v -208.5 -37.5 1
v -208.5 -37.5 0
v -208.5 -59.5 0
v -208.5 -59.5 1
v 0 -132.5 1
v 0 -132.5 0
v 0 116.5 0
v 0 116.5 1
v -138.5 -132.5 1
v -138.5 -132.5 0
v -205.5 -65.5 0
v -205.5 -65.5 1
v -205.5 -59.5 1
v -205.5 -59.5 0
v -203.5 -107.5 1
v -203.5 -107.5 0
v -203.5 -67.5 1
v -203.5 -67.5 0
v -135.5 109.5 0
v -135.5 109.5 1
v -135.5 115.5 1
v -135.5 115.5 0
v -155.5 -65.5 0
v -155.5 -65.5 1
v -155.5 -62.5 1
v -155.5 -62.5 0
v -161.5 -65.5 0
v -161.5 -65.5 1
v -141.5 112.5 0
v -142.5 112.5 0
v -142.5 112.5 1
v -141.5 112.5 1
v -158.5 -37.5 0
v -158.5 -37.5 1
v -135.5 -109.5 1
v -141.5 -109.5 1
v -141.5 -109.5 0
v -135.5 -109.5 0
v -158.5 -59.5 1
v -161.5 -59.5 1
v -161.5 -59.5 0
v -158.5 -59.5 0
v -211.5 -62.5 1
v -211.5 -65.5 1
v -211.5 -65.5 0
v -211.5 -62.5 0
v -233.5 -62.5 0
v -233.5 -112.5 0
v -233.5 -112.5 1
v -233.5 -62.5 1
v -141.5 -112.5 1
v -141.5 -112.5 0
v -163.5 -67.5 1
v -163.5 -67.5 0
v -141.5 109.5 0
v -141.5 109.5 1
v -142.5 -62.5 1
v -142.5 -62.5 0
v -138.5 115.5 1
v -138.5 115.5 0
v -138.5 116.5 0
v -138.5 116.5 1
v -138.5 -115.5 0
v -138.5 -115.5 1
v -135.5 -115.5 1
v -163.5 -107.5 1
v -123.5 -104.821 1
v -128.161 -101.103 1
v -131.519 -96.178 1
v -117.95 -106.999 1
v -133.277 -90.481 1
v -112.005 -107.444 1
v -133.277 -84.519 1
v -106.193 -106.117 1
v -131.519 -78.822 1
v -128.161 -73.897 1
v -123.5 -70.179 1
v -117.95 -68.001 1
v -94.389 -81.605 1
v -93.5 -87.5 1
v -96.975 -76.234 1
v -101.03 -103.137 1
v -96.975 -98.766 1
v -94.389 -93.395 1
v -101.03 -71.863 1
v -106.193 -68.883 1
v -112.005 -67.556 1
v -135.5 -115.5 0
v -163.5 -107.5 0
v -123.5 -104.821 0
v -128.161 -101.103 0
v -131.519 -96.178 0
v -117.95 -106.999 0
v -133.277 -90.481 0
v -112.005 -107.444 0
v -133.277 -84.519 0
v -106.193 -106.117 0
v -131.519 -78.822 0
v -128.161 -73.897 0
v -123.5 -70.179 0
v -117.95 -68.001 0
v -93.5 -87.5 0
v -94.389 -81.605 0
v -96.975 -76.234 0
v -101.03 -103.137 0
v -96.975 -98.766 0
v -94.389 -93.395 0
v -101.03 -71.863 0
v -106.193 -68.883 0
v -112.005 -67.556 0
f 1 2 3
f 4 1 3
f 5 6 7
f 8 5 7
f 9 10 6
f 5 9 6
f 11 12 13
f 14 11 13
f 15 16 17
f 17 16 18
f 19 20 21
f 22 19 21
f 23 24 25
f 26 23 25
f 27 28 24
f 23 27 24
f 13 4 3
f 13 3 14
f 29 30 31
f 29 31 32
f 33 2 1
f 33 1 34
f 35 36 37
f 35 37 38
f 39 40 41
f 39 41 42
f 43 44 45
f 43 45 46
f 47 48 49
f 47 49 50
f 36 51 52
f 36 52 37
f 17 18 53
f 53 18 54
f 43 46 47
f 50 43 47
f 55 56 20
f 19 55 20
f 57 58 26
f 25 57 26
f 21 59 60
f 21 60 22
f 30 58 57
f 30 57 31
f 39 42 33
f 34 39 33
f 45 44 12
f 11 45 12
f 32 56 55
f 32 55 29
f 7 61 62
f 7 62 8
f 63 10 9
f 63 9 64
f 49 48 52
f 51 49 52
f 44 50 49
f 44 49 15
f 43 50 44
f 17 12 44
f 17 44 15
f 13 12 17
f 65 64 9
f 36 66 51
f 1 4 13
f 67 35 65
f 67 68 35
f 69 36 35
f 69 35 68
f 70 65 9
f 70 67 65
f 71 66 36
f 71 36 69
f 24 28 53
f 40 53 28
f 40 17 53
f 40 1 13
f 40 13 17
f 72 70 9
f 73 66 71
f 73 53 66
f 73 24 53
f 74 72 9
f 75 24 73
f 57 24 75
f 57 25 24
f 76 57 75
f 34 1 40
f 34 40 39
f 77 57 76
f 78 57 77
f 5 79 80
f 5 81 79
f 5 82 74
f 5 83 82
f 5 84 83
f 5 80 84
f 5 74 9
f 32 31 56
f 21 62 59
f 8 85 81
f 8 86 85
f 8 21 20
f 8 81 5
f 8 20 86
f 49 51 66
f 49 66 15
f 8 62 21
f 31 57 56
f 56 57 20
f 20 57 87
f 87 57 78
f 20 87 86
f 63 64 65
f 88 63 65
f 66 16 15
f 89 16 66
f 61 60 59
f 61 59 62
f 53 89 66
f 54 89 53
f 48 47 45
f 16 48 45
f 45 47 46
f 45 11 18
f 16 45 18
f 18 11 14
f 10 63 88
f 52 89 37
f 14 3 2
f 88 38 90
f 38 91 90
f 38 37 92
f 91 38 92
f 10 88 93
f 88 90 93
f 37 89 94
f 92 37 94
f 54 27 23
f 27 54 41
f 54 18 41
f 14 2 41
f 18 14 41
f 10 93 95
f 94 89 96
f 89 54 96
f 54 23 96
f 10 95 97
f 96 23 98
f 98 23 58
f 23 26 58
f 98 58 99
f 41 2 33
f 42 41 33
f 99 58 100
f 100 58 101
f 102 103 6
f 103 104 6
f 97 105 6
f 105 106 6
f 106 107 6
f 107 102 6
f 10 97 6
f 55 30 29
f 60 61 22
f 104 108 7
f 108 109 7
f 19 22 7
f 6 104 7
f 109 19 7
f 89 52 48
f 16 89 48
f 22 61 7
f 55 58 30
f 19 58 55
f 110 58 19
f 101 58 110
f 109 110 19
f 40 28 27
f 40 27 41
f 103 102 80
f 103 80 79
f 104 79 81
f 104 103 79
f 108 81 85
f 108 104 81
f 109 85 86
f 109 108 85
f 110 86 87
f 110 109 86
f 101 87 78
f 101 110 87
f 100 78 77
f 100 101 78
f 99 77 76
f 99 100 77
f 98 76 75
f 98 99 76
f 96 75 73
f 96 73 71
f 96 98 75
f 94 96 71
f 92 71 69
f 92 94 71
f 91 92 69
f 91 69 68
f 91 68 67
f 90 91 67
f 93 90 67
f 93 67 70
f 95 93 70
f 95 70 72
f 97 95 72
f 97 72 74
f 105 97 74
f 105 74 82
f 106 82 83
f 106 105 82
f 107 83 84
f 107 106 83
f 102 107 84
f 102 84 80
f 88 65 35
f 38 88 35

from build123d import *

# Parameters (mm, degrees)
F0_W     = 5
F0_H     = 50
F0_W_2   = 138.5
F0_H_2   = 20
F0_W_3   = 50
F0_H_3   = 5
F0_H_4   = 4
F0_W_4   = 20
F0_W_5   = 4
F0_H_5   = 175
F0_W_6   = 40
F0_H_6   = 40
F0_R     = 20
F1_DEPTH = 1
F0_W_7   = 128.5
F0_H_7   = 147
F2_DEPTH = 1
F3_W     = 6
F3_H     = 6
F4_DEPTH = 25


with BuildPart() as f1:
    # F0 (on Top) → F1 (new body)
    with BuildSketch(Plane.XY):
        with Locations((-231, -87.5)):
            Rectangle(F0_W, F0_H)
        with Locations((-69.25, -122.5)):
            Rectangle(F0_W_2, F0_H_2)
        with Locations((-183.5, -40)):
            Rectangle(F0_W_3, F0_H_3)
        with Locations((-69.25, 114.5)):
            Rectangle(F0_W_2, F0_H_4)
        with Locations((-218.5, -87.5)):
            Rectangle(F0_W_4, F0_H)
        with Locations((-183.5, -52.5)):
            Rectangle(F0_W_3, F0_H_2)
        with Locations((-140.5, 25)):
            Rectangle(F0_W_5, F0_H_5)
        Polygon((-138.5, -112.5), (-138.5, -62.5), (-142.5, -62.5), (-158.5, -62.5), (-158.5, -112.5), align=None)
        with Locations((-183.5, -87.5)):
            Rectangle(F0_W_3, F0_H)
        with Locations((-183.5, -87.5)):
            Rectangle(F0_W_6, F0_H_6, mode=Mode.SUBTRACT)
        Polygon((0, 102.5), (0, 112.5), (-138.5, 112.5), (-138.5, -62.5), (-138.5, -112.5), (0, -112.5), (0, -44.5), (-128.5, -44.5), (-128.5, 102.5), align=None)
        with Locations((-113.5, -87.5)):
            Circle(F0_R, mode=Mode.SUBTRACT)
    extrude(amount=F1_DEPTH)

    # F0 (on Top) → F2 (join)
    with BuildSketch(Plane.XY):
        Polygon((0, 102.5), (0, 112.5), (-138.5, 112.5), (-138.5, -62.5), (-138.5, -112.5), (0, -112.5), (0, -44.5), (-128.5, -44.5), (-128.5, 102.5), align=None)
        with Locations((-113.5, -87.5)):
            Circle(F0_R, mode=Mode.SUBTRACT)
        with Locations((-69.25, 114.5)):
            Rectangle(F0_W_2, F0_H_4)
        with Locations((-140.5, 25)):
            Rectangle(F0_W_5, F0_H_5)
        with Locations((-64.25, 29)):
            Rectangle(F0_W_7, F0_H_7)
        Polygon((-138.5, -112.5), (-138.5, -62.5), (-142.5, -62.5), (-158.5, -62.5), (-158.5, -112.5), align=None)
        with Locations((-69.25, -122.5)):
            Rectangle(F0_W_2, F0_H_2)
        with Locations((-183.5, -87.5)):
            Rectangle(F0_W_3, F0_H)
        with Locations((-183.5, -87.5)):
            Rectangle(F0_W_6, F0_H_6, mode=Mode.SUBTRACT)
        with Locations((-183.5, -52.5)):
            Rectangle(F0_W_3, F0_H_2)
        with Locations((-218.5, -87.5)):
            Rectangle(F0_W_4, F0_H)
        with Locations((-183.5, -40)):
            Rectangle(F0_W_3, F0_H_3)
        with Locations((-231, -87.5)):
            Rectangle(F0_W, F0_H)
    extrude(amount=F2_DEPTH)

    # F3 (on face) → F4 (cut)
    with BuildSketch(Plane.XY.offset(1)):
        with Locations((-138.5, -112.5)):
            Rectangle(F3_W, F3_H)
        with Locations((-158.5, -62.5)):
            Rectangle(F3_W, F3_H)
        with Locations((-208.5, -62.5)):
            Rectangle(F3_W, F3_H)
        with Locations((-138.5, 112.5)):
            Rectangle(F3_W, F3_H)
    extrude(amount=-F4_DEPTH, mode=Mode.SUBTRACT)


solid = f1.part
